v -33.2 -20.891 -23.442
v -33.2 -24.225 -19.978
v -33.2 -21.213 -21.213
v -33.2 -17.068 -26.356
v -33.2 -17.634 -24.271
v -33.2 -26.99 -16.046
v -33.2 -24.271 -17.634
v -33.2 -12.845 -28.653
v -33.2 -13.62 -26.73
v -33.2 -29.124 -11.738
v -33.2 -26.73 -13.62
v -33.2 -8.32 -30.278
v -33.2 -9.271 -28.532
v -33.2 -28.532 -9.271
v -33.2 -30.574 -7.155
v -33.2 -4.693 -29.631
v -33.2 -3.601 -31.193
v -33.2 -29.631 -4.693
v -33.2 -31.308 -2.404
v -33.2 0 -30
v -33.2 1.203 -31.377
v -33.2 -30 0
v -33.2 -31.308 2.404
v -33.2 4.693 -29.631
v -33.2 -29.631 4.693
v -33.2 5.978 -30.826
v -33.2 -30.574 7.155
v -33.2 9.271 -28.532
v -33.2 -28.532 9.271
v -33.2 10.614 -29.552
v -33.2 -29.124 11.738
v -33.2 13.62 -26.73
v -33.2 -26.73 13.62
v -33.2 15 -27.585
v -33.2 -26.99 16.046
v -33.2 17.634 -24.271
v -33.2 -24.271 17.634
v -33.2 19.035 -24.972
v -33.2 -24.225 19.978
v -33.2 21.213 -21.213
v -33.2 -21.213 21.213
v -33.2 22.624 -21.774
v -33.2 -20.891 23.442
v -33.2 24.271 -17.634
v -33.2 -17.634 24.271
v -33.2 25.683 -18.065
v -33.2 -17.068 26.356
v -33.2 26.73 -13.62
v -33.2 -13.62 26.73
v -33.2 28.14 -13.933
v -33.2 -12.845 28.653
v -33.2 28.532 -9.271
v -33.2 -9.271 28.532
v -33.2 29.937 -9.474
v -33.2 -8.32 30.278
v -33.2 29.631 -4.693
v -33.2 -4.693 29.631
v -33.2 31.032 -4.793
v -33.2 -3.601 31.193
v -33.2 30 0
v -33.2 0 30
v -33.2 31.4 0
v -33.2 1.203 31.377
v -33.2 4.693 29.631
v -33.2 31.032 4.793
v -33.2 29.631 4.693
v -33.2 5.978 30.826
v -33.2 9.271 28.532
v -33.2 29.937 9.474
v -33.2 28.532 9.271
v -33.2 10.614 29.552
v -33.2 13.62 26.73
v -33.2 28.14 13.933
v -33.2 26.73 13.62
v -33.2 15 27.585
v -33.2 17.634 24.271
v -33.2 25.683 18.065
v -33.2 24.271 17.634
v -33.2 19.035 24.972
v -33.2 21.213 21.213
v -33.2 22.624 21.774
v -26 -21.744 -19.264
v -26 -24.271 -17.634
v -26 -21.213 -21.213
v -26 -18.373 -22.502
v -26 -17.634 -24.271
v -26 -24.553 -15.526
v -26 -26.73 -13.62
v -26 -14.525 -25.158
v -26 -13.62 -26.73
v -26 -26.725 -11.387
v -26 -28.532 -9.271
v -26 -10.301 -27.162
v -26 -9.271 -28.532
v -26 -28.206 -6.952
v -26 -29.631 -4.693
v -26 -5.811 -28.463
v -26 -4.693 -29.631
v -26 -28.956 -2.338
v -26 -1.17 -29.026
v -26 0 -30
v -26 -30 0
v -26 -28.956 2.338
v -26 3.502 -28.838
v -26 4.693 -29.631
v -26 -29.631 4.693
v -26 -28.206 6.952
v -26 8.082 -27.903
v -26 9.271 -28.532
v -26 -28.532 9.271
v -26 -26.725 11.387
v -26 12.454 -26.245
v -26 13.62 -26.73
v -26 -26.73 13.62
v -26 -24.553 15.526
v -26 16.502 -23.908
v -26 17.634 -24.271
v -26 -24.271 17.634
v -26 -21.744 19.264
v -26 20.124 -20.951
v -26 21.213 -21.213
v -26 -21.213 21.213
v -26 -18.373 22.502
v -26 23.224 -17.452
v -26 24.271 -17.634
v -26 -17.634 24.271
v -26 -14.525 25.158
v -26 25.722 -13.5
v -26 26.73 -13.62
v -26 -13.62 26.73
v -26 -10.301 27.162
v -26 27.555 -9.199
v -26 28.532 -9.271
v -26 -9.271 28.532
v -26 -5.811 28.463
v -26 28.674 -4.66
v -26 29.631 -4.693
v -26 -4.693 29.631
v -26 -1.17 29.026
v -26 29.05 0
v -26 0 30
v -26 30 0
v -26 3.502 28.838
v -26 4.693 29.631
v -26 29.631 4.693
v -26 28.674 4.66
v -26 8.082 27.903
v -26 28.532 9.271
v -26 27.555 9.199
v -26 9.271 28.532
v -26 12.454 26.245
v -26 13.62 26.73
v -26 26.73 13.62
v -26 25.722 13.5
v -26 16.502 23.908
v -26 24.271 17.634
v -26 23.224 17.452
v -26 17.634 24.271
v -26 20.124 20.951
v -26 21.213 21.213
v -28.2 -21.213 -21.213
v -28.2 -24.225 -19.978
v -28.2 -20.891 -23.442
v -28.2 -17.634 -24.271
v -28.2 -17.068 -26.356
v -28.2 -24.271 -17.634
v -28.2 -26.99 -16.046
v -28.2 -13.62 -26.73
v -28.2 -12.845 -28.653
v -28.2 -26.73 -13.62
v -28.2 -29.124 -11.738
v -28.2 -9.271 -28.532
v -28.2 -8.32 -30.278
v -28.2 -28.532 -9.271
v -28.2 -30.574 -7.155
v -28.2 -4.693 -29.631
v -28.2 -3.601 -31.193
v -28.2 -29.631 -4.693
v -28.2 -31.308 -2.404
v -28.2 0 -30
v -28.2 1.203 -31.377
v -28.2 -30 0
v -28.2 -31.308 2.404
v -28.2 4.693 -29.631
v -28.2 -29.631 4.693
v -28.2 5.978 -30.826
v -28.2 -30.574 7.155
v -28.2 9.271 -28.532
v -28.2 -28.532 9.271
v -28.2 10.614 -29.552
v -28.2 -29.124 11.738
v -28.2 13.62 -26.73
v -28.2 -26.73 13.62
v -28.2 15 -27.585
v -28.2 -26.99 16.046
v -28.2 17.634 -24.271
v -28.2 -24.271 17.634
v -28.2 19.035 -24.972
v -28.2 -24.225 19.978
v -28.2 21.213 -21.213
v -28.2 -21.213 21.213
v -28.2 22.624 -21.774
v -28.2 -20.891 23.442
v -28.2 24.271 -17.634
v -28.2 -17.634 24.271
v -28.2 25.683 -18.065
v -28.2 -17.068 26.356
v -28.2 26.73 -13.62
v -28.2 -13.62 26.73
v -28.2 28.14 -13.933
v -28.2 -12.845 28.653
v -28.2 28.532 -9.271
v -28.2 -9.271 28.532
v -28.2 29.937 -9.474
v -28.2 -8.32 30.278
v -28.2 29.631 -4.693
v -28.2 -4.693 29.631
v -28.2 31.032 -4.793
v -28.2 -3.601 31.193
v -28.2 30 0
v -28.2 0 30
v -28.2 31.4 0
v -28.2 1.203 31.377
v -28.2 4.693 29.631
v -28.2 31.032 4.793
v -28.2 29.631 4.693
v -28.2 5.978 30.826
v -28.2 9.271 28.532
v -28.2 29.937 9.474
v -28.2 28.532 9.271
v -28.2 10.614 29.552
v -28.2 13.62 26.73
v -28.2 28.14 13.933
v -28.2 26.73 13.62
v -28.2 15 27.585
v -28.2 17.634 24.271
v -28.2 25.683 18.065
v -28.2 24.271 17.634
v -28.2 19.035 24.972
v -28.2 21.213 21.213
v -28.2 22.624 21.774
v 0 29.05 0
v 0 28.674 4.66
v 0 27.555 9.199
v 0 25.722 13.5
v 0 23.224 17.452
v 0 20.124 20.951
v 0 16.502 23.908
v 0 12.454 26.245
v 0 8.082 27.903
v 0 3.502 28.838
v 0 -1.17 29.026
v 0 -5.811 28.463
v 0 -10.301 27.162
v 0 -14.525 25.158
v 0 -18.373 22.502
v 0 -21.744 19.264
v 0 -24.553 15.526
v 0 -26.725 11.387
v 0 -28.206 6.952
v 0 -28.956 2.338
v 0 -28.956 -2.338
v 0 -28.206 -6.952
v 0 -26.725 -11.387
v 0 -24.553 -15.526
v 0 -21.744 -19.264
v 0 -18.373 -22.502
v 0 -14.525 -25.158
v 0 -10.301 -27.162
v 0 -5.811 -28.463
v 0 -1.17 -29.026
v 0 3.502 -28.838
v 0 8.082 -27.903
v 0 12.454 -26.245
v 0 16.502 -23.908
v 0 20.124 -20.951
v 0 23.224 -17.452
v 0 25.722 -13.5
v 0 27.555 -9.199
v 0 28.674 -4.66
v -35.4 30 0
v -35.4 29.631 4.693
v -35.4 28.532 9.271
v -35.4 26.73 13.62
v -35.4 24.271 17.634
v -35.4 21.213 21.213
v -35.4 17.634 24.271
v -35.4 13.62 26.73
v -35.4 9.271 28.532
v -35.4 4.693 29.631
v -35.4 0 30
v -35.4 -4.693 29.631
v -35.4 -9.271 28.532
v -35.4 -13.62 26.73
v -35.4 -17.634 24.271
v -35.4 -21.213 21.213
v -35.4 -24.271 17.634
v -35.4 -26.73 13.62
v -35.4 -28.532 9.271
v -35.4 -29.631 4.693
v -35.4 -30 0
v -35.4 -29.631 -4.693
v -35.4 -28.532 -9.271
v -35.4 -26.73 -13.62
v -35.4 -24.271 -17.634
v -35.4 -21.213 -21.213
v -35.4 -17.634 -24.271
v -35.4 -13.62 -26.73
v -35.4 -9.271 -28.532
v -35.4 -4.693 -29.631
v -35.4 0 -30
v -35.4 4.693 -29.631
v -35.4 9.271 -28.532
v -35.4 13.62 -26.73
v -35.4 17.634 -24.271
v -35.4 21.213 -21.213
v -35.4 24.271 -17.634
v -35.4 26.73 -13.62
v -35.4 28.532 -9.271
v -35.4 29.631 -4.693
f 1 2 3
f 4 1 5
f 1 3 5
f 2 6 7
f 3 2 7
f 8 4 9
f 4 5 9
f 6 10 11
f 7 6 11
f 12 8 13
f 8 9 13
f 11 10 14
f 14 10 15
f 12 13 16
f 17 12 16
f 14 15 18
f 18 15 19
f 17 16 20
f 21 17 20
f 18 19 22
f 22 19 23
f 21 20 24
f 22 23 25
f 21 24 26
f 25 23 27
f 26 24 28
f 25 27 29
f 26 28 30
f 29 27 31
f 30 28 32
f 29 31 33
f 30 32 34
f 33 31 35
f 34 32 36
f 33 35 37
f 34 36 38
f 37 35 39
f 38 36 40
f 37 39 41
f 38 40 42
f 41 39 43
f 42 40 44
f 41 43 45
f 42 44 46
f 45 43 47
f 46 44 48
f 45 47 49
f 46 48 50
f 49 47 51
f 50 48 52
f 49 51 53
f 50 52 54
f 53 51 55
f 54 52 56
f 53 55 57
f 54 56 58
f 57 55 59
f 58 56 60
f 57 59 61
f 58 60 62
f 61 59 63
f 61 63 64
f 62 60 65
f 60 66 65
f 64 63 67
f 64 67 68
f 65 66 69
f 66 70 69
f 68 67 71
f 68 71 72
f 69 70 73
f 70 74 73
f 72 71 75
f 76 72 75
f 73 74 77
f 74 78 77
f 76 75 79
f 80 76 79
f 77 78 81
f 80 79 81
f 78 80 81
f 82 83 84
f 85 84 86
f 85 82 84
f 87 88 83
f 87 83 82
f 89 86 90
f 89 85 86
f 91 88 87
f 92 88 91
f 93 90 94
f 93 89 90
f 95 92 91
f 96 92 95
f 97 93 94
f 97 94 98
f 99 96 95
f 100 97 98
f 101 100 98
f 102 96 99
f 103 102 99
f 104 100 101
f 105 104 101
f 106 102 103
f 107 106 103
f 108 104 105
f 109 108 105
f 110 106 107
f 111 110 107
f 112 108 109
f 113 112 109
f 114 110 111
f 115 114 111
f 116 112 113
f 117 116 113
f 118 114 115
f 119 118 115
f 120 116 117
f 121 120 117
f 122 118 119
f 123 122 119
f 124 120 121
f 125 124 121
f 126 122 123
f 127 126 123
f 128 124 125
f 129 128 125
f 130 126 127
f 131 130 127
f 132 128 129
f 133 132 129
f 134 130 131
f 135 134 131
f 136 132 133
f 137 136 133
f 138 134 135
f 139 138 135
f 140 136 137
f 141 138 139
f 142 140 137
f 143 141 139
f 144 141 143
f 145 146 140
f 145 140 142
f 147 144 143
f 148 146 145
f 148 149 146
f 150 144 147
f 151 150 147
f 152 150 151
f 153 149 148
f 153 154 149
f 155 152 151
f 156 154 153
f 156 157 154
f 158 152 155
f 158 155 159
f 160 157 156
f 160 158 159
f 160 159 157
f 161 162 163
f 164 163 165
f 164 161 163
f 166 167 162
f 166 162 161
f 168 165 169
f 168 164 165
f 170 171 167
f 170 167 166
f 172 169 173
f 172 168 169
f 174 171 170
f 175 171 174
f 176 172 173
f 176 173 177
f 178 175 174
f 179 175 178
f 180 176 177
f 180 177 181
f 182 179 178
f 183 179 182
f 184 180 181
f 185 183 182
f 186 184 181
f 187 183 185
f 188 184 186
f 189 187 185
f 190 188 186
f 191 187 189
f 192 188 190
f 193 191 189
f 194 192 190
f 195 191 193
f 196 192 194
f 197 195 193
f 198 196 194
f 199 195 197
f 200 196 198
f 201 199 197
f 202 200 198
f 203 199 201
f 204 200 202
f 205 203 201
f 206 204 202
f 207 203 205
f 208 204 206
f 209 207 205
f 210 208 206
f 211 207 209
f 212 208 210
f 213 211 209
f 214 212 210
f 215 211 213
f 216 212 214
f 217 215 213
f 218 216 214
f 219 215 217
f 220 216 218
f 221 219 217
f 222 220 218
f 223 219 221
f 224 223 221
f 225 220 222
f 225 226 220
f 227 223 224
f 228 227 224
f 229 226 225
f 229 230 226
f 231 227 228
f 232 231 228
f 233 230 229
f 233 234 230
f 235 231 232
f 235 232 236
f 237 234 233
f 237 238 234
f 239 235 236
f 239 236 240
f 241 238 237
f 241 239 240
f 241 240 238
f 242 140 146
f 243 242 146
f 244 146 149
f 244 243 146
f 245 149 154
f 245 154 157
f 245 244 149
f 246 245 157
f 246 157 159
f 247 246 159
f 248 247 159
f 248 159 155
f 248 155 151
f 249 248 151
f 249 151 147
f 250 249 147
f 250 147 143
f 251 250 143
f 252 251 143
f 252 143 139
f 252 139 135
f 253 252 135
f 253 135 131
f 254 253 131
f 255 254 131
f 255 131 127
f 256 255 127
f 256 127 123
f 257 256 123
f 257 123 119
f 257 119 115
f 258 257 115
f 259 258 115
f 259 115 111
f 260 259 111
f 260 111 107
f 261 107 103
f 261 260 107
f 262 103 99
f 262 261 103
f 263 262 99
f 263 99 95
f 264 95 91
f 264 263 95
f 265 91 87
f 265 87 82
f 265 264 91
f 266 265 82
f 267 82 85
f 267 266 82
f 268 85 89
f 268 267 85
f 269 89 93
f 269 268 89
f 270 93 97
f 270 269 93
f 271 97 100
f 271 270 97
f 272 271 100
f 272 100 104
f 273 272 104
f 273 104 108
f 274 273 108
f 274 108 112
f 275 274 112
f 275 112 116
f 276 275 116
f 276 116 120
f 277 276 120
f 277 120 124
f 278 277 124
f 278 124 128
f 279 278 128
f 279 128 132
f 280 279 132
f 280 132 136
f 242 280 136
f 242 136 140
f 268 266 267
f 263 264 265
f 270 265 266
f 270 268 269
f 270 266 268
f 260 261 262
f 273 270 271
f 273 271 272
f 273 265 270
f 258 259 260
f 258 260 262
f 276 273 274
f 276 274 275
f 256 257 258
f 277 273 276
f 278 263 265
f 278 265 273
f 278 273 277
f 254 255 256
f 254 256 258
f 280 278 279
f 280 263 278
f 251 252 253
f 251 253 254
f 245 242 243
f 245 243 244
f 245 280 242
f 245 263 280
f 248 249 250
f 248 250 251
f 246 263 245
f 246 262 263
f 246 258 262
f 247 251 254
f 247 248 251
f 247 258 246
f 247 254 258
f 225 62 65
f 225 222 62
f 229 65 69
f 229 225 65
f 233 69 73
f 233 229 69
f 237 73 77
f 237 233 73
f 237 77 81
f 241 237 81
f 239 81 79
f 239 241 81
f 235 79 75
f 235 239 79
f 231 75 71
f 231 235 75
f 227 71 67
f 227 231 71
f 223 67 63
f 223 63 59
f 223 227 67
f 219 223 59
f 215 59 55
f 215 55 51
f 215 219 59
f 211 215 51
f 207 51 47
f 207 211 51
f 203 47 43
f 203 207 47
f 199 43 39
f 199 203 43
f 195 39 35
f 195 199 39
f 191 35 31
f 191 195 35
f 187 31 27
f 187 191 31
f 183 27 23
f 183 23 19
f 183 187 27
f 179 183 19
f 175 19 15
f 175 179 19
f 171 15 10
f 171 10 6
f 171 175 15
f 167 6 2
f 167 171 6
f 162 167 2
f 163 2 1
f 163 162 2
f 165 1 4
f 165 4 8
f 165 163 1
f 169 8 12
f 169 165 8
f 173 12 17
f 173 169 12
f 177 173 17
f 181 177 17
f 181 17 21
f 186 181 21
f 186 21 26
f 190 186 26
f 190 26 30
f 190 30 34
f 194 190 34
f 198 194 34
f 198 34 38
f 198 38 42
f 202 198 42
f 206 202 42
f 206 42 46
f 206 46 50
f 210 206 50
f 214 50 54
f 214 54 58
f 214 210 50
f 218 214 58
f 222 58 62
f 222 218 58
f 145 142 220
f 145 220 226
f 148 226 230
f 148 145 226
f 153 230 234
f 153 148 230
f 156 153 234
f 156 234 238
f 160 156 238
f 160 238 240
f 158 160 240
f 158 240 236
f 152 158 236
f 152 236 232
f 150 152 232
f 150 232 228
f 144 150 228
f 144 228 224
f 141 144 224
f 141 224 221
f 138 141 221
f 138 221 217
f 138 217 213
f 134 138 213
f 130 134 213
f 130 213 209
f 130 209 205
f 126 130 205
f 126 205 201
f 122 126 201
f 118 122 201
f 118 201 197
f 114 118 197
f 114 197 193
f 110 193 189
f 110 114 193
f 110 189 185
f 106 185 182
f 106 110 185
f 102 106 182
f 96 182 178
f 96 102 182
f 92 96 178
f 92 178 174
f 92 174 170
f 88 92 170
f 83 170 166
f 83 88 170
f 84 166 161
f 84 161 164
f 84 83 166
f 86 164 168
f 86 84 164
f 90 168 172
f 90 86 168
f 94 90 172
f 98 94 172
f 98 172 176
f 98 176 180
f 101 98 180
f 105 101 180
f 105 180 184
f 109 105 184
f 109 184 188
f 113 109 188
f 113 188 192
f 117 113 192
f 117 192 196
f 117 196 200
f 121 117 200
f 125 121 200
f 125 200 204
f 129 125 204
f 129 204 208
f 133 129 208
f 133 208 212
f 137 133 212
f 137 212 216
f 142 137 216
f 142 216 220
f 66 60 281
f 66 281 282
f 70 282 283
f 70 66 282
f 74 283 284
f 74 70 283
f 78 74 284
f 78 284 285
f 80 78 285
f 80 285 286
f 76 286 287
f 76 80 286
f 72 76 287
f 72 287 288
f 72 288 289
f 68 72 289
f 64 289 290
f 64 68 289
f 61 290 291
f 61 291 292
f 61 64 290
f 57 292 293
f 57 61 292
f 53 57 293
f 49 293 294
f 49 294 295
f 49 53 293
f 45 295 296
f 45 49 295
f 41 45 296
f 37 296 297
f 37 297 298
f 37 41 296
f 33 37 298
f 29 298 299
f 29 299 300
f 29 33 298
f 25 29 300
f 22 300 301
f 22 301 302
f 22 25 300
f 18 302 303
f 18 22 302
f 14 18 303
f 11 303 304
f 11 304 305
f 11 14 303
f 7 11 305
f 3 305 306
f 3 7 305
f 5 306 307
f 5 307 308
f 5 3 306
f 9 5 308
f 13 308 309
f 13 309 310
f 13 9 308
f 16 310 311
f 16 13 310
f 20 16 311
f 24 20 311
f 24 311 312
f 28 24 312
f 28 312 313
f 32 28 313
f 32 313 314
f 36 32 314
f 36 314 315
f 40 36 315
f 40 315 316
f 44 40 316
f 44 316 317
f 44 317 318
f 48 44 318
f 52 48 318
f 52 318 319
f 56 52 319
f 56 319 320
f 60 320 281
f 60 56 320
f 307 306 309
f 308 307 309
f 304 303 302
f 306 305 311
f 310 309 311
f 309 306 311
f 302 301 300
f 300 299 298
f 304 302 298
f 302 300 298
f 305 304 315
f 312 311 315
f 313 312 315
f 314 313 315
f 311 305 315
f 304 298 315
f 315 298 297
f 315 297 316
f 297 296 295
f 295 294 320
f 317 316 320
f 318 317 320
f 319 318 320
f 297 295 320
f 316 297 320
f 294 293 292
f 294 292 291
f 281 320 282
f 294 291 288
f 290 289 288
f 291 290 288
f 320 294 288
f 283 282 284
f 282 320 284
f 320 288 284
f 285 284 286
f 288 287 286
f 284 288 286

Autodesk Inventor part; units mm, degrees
ref_plane "YZ Plane" through (0, 0, 0) normal (1, 0, 0) x (0, 1, 0)
ref_plane "XZ Plane" through (0, 0, 0) normal (0, 1, 0) x (-1, 0, 0)
ref_plane "XY Plane" through (0, 0, 0) normal (0, 0, 1) x (1, 0, 0)
sketch "Náčrt1" plane through (0, 0, 0) normal (0, 0, 1) x (1, 0, 0)
  line L0 (-42.48, 0) -> (7.08, 0) projected
  line L1 (0, 37.68) -> (0, -6.28) projected
  line L2 (-35.4, 0) -> (0, 0)
  line L3 (-35.4, 0) -> (-35.4, 30)
  line L4 (-35.4, 30) -> (-33.2, 30)
  line L5 (-33.2, 30) -> (-33.2, 31.4)
  line L6 (-33.2, 31.4) -> (-28.2, 31.4)
  line L7 (-28.2, 31.4) -> (-28.2, 30)
  line L8 (-28.2, 30) -> (-26, 30)
  line L9 (-26, 30) -> (-26, 29.05)
  line L10 (-26, 29.05) -> (0, 29.05)
  line L11 (0, 29.05) -> (0, 0)
  point P0 (0, 0)
  point P1 (0, 29.05)
  dimension "d1" = 29.05
  dimension "d2" = 30
  dimension "d3" = 31.4
  dimension "d4" = 35.4
  dimension "d5" = 2.2
  dimension "d6" = 2.2
  dimension "d7" = 5
revolve "Rotace1" add sketch "Náčrt1" angle 360 about axis through (0, 0, 0) along (1, 0, 0)
properties part number "prop_meter"
